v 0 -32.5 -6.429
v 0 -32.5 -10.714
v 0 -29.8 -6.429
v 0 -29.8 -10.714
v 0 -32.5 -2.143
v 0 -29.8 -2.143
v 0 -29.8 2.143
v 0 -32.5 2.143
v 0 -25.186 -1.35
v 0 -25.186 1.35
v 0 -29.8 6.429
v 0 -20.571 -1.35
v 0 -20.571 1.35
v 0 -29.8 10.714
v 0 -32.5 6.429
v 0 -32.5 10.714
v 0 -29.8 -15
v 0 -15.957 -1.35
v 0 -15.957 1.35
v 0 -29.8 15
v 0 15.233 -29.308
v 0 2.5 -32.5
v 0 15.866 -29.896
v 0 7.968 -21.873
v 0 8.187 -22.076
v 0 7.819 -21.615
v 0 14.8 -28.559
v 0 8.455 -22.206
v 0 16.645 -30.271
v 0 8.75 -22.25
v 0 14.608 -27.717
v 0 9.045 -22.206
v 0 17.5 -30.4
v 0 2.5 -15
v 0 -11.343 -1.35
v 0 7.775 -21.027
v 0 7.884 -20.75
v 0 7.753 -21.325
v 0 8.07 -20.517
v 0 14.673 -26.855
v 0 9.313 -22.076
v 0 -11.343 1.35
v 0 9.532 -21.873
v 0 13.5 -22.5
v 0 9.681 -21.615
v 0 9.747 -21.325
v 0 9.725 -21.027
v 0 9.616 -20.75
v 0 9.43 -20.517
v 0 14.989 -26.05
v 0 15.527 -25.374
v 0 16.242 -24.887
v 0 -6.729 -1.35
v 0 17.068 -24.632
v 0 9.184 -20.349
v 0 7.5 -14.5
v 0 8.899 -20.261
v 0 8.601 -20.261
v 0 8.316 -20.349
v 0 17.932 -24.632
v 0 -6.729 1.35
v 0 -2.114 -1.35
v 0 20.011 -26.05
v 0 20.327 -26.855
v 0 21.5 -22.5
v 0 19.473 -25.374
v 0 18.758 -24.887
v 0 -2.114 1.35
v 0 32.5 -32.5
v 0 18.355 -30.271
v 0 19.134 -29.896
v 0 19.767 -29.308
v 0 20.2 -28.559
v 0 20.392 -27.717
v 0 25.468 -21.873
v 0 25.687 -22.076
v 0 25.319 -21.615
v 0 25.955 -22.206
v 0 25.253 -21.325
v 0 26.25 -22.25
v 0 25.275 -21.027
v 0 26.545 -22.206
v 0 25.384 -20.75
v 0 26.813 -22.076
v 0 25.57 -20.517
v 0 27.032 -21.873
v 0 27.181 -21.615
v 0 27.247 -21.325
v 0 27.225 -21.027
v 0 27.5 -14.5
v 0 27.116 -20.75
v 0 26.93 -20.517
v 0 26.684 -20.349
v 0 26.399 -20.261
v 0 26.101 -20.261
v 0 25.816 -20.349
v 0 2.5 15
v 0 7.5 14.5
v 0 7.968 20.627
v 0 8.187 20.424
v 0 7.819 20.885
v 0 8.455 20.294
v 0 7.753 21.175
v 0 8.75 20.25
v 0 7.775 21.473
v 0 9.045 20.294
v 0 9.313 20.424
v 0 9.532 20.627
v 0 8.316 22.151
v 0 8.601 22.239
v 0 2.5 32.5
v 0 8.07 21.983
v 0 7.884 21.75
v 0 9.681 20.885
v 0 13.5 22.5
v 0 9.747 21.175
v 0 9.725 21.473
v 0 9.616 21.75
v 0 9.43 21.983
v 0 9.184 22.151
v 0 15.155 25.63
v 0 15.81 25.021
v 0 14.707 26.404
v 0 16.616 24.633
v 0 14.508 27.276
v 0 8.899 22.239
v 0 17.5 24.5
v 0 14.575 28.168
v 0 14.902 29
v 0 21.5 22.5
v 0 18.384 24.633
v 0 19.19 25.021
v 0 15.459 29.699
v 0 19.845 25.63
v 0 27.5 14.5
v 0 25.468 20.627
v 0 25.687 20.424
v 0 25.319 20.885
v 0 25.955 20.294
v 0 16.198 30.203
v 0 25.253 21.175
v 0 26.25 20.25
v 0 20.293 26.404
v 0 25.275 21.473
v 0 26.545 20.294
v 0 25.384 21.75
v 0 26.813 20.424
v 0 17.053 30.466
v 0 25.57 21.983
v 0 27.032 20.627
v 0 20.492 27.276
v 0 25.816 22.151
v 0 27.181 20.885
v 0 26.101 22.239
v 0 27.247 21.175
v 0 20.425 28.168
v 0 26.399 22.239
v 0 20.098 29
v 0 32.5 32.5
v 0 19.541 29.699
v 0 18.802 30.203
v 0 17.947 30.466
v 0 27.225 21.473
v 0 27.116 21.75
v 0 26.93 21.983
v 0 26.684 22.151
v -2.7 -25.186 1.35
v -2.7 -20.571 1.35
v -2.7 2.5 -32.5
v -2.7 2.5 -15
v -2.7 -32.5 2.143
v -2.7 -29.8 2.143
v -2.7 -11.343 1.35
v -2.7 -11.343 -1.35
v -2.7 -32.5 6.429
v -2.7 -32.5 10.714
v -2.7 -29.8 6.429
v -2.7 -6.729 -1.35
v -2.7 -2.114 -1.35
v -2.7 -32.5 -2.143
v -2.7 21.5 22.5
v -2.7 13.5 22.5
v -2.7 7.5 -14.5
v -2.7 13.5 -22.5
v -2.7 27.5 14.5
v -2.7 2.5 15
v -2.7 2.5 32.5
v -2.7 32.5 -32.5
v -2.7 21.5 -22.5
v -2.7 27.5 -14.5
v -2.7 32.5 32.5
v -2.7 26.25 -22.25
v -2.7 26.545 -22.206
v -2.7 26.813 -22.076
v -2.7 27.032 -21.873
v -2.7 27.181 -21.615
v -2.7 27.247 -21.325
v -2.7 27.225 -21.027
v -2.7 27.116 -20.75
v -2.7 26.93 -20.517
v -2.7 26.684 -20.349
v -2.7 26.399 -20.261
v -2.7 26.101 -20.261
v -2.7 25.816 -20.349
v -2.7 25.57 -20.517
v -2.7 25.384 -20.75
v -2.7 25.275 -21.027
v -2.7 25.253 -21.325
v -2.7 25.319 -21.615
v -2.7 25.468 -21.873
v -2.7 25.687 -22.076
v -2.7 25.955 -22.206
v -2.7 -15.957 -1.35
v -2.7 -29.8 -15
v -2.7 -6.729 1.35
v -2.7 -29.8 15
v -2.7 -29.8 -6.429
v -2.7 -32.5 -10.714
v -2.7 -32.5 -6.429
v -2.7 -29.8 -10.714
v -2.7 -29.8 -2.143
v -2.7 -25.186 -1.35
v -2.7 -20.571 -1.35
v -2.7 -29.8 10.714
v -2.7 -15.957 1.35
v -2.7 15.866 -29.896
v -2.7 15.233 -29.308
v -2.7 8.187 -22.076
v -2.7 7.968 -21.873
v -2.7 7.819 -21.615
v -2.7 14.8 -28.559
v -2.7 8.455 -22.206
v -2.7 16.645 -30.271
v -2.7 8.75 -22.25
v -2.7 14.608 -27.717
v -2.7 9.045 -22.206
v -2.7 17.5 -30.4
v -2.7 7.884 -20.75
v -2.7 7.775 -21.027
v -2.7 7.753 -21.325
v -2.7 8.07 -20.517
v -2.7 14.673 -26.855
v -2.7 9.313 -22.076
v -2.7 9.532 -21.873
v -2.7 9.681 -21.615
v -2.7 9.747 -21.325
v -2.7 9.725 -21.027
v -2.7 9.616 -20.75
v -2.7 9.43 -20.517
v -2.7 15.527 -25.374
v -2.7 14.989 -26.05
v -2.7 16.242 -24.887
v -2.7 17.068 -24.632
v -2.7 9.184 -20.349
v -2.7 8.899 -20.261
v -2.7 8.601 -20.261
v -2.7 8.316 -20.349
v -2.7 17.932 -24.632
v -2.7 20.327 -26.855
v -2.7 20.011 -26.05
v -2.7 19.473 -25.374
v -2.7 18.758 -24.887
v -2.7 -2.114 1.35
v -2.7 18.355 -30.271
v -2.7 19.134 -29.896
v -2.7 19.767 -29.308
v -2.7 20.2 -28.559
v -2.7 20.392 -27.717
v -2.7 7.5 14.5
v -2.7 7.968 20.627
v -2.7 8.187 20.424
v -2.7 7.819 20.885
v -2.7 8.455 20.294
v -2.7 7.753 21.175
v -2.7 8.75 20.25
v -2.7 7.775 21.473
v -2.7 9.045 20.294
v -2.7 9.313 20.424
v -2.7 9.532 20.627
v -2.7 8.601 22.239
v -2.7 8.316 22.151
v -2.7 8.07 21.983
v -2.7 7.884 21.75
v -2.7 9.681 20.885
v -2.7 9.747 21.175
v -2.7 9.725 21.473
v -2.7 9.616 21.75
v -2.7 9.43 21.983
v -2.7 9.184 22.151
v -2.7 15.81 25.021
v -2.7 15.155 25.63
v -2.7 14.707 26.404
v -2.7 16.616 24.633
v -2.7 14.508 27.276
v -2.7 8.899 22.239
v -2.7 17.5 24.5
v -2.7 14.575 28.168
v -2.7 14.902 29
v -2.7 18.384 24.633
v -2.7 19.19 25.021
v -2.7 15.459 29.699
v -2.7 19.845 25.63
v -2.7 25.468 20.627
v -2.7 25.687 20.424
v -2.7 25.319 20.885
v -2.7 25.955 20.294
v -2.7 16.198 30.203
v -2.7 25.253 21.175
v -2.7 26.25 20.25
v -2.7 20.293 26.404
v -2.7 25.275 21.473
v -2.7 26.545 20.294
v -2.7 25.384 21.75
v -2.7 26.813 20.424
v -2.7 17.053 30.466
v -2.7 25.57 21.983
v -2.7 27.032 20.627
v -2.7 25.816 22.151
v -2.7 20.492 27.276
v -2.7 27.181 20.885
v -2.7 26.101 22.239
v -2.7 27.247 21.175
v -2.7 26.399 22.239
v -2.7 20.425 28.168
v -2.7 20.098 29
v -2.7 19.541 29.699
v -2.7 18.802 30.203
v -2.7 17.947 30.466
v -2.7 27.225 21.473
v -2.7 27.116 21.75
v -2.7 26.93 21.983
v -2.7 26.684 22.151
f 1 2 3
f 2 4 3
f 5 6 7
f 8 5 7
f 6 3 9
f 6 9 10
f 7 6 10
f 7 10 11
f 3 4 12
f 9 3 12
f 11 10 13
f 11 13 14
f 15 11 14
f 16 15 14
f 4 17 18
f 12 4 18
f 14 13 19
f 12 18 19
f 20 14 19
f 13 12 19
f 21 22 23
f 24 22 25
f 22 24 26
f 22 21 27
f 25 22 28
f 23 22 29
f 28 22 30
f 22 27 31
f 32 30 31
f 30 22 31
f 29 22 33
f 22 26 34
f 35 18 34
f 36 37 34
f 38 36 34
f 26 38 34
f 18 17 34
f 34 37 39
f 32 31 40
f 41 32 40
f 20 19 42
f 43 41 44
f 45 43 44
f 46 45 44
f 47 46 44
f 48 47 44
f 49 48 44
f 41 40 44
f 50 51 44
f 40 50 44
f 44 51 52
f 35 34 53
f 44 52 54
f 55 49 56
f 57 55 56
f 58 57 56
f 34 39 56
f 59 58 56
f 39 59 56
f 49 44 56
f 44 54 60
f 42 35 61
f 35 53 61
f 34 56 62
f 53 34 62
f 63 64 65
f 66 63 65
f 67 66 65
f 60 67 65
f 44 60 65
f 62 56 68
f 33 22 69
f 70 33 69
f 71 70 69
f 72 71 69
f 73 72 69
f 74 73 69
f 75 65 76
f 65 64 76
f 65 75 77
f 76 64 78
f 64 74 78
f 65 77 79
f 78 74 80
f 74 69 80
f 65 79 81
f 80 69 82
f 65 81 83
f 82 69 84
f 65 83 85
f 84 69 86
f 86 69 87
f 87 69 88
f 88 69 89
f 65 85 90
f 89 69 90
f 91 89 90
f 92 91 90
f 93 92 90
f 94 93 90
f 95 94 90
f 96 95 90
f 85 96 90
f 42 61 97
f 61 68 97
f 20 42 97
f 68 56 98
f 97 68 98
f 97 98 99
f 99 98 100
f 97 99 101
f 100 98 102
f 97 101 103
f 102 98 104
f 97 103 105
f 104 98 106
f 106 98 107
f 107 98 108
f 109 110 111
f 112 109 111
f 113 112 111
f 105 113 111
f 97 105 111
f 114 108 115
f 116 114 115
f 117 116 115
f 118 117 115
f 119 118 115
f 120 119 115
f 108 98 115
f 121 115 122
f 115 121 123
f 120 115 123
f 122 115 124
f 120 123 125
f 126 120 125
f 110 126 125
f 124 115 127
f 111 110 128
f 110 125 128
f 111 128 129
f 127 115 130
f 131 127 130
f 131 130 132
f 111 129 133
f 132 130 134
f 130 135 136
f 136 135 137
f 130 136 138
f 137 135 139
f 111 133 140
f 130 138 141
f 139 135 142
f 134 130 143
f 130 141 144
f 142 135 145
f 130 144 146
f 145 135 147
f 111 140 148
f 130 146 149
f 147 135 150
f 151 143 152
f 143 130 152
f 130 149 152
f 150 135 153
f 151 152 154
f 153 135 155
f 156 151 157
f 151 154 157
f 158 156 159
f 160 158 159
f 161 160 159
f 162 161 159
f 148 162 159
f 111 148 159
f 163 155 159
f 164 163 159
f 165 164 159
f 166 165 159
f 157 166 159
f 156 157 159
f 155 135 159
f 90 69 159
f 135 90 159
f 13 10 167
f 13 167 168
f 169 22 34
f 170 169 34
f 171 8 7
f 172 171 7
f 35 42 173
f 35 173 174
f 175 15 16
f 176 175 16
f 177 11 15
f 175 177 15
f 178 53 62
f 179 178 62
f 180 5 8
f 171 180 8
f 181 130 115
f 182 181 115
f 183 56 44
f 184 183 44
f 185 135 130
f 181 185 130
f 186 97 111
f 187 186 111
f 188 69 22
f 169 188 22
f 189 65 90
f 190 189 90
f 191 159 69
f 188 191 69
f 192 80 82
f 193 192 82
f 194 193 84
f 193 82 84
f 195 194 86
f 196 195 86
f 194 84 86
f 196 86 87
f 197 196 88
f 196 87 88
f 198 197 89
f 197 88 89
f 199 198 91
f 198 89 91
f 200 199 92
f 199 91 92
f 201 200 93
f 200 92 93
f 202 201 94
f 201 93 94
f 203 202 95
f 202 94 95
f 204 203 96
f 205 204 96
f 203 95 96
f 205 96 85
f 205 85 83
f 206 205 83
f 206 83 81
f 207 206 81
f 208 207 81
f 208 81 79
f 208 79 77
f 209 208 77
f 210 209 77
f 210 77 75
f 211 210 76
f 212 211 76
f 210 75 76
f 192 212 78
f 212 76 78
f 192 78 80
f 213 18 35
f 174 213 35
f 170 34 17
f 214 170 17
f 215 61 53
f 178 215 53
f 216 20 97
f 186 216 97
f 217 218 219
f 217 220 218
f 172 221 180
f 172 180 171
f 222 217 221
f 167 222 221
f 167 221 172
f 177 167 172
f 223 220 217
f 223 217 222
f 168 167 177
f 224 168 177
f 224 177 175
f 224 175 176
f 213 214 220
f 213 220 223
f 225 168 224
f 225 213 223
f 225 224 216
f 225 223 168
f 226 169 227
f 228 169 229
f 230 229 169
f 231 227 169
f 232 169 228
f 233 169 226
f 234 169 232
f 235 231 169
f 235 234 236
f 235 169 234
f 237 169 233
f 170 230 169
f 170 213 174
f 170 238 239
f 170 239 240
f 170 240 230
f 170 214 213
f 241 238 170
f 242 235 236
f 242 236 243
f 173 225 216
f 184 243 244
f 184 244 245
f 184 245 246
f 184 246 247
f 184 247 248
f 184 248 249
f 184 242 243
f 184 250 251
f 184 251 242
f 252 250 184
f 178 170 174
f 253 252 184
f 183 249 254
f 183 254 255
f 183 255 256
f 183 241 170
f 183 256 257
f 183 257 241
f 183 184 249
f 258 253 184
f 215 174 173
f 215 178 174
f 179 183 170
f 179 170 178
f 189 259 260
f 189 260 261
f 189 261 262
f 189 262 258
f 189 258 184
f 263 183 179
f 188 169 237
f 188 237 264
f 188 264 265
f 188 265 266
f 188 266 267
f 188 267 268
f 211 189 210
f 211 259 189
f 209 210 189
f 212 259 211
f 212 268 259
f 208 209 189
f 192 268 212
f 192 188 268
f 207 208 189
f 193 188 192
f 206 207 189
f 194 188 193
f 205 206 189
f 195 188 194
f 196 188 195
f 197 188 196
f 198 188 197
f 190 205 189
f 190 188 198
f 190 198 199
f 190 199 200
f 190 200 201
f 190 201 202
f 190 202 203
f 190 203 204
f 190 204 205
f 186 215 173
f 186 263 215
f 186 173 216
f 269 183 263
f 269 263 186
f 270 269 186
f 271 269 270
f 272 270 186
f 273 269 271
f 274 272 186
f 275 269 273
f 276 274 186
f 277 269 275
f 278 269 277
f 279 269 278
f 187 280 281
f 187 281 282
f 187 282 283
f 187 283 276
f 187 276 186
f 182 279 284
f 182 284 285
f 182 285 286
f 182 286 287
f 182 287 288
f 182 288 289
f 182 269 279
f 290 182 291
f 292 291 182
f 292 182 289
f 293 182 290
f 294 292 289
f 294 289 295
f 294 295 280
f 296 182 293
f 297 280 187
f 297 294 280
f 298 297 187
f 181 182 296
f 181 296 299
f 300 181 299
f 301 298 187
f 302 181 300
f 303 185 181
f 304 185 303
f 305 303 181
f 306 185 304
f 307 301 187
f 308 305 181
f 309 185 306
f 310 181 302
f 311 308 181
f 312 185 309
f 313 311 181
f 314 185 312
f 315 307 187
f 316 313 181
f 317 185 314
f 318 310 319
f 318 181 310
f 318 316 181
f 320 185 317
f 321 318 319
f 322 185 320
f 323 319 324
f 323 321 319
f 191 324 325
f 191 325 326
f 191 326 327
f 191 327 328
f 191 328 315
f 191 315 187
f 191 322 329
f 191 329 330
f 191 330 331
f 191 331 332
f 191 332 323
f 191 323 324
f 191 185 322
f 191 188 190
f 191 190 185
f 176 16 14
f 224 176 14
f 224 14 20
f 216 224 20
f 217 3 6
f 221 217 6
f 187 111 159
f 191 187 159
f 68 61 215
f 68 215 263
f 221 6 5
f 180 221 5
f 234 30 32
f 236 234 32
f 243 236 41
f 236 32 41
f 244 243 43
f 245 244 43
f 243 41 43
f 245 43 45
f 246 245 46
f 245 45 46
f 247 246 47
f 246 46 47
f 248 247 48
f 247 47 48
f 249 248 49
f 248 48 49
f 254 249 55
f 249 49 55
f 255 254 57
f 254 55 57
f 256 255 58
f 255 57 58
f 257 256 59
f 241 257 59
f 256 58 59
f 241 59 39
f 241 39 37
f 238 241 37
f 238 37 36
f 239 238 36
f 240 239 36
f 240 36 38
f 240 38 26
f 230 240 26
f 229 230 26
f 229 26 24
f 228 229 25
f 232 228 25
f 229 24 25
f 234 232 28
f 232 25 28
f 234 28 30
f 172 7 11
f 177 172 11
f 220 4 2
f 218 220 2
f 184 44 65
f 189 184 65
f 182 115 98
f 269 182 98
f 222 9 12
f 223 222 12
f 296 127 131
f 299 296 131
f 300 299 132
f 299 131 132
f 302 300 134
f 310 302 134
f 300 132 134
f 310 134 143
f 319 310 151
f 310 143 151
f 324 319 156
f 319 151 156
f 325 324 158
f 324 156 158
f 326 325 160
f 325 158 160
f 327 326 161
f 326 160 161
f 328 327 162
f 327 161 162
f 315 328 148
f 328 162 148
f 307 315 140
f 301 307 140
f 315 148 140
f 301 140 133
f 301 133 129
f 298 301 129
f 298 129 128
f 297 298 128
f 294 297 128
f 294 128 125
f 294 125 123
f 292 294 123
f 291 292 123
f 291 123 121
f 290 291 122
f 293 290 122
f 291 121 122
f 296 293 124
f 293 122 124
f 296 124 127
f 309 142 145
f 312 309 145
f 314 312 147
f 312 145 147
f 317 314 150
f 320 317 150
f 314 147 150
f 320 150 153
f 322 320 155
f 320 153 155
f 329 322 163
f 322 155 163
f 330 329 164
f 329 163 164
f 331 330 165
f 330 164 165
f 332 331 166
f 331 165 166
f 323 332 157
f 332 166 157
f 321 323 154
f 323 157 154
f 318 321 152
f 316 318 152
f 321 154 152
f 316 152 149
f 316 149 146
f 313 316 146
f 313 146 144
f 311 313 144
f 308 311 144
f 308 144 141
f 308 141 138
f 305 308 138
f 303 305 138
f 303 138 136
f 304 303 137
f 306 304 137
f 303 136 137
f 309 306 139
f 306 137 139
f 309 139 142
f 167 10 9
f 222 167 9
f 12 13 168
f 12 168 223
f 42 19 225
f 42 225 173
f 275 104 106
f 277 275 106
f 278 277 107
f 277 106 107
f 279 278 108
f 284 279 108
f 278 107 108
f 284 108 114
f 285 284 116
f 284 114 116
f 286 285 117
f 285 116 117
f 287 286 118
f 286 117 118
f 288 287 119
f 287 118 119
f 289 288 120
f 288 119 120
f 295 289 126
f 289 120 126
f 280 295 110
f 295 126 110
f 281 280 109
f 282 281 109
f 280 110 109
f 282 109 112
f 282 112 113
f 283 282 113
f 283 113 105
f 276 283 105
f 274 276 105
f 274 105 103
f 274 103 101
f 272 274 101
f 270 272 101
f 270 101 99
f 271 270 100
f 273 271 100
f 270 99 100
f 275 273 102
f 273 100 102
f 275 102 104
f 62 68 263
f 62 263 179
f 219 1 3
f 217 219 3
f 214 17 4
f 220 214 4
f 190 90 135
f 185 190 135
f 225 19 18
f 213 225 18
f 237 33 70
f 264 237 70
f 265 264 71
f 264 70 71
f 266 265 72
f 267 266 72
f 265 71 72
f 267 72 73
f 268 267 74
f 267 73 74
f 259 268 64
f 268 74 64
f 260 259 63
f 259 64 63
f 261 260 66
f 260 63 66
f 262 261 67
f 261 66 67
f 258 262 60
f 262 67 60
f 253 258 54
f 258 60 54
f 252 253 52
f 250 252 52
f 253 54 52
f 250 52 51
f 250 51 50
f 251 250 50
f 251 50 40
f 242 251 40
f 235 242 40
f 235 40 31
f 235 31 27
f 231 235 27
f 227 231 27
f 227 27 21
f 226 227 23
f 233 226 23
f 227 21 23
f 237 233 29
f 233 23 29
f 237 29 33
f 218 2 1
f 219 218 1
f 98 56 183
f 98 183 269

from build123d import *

# Parameters (mm, degrees)
SKETCH1_R           = 1
SKETCH1_R_2         = 3
SKETCH1_R_3         = 2.9
SKETCH1_W           = 2.7
SKETCH1_H           = 4.614285715
SKETCH1_H_2         = 4.614285714
BOSS_EXTRUDE1_DEPTH = 2.7


with BuildPart() as part:
    # Sketch1 → Boss-Extrude1 (new body)
    with BuildSketch(Plane(origin=(0, 0, 0), x_dir=(0, 0, -1), z_dir=(1, 0, 0))):
        Polygon((10.714285714, -32.5), (6.428571429, -32.5), (6.428571429, -29.8), (2.142857143, -29.8), (2.142857143, -32.5), (-2.142857143, -32.5), (-2.142857143, -29.8), (-6.428571429, -29.8), (-6.428571429, -32.5), (-10.714285714, -32.5), (-10.714285714, -29.8), (-15, -29.8), (-15, 2.5), (-32.5, 2.5), (-32.5, 32.5), (32.5, 32.5), (32.5, 2.5), (15, 2.5), (15, -29.8), (10.714285714, -29.8), align=None)
        with Locations((21.25, 26.25)):
            Circle(SKETCH1_R, mode=Mode.SUBTRACT)
        with Locations((21.25, 8.75)):
            Circle(SKETCH1_R, mode=Mode.SUBTRACT)
        with Locations((-21.25, 8.75)):
            Circle(SKETCH1_R, mode=Mode.SUBTRACT)
        with Locations((-21.25, 26.25)):
            Circle(SKETCH1_R, mode=Mode.SUBTRACT)
        with Locations((-27.5, 17.5)):
            Circle(SKETCH1_R_2, mode=Mode.SUBTRACT)
        with Locations((27.5, 17.5)):
            Circle(SKETCH1_R_3, mode=Mode.SUBTRACT)
        with Locations((0, -4.421428571)):
            Rectangle(SKETCH1_W, SKETCH1_H, mode=Mode.SUBTRACT)
        with Locations((0, -13.65)):
            Rectangle(SKETCH1_W, SKETCH1_H_2, mode=Mode.SUBTRACT)
        with Locations((0, -22.878571429)):
            Rectangle(SKETCH1_W, SKETCH1_H, mode=Mode.SUBTRACT)
        Polygon((0, 7.5), (14.5, 7.5), (22.5, 13.5), (22.5, 21.5), (14.5, 27.5), (-14.5, 27.5), (-22.5, 21.5), (-22.5, 13.5), (-14.5, 7.5), align=None, mode=Mode.SUBTRACT)
    extrude(amount=-BOSS_EXTRUDE1_DEPTH)


solid = part.part
